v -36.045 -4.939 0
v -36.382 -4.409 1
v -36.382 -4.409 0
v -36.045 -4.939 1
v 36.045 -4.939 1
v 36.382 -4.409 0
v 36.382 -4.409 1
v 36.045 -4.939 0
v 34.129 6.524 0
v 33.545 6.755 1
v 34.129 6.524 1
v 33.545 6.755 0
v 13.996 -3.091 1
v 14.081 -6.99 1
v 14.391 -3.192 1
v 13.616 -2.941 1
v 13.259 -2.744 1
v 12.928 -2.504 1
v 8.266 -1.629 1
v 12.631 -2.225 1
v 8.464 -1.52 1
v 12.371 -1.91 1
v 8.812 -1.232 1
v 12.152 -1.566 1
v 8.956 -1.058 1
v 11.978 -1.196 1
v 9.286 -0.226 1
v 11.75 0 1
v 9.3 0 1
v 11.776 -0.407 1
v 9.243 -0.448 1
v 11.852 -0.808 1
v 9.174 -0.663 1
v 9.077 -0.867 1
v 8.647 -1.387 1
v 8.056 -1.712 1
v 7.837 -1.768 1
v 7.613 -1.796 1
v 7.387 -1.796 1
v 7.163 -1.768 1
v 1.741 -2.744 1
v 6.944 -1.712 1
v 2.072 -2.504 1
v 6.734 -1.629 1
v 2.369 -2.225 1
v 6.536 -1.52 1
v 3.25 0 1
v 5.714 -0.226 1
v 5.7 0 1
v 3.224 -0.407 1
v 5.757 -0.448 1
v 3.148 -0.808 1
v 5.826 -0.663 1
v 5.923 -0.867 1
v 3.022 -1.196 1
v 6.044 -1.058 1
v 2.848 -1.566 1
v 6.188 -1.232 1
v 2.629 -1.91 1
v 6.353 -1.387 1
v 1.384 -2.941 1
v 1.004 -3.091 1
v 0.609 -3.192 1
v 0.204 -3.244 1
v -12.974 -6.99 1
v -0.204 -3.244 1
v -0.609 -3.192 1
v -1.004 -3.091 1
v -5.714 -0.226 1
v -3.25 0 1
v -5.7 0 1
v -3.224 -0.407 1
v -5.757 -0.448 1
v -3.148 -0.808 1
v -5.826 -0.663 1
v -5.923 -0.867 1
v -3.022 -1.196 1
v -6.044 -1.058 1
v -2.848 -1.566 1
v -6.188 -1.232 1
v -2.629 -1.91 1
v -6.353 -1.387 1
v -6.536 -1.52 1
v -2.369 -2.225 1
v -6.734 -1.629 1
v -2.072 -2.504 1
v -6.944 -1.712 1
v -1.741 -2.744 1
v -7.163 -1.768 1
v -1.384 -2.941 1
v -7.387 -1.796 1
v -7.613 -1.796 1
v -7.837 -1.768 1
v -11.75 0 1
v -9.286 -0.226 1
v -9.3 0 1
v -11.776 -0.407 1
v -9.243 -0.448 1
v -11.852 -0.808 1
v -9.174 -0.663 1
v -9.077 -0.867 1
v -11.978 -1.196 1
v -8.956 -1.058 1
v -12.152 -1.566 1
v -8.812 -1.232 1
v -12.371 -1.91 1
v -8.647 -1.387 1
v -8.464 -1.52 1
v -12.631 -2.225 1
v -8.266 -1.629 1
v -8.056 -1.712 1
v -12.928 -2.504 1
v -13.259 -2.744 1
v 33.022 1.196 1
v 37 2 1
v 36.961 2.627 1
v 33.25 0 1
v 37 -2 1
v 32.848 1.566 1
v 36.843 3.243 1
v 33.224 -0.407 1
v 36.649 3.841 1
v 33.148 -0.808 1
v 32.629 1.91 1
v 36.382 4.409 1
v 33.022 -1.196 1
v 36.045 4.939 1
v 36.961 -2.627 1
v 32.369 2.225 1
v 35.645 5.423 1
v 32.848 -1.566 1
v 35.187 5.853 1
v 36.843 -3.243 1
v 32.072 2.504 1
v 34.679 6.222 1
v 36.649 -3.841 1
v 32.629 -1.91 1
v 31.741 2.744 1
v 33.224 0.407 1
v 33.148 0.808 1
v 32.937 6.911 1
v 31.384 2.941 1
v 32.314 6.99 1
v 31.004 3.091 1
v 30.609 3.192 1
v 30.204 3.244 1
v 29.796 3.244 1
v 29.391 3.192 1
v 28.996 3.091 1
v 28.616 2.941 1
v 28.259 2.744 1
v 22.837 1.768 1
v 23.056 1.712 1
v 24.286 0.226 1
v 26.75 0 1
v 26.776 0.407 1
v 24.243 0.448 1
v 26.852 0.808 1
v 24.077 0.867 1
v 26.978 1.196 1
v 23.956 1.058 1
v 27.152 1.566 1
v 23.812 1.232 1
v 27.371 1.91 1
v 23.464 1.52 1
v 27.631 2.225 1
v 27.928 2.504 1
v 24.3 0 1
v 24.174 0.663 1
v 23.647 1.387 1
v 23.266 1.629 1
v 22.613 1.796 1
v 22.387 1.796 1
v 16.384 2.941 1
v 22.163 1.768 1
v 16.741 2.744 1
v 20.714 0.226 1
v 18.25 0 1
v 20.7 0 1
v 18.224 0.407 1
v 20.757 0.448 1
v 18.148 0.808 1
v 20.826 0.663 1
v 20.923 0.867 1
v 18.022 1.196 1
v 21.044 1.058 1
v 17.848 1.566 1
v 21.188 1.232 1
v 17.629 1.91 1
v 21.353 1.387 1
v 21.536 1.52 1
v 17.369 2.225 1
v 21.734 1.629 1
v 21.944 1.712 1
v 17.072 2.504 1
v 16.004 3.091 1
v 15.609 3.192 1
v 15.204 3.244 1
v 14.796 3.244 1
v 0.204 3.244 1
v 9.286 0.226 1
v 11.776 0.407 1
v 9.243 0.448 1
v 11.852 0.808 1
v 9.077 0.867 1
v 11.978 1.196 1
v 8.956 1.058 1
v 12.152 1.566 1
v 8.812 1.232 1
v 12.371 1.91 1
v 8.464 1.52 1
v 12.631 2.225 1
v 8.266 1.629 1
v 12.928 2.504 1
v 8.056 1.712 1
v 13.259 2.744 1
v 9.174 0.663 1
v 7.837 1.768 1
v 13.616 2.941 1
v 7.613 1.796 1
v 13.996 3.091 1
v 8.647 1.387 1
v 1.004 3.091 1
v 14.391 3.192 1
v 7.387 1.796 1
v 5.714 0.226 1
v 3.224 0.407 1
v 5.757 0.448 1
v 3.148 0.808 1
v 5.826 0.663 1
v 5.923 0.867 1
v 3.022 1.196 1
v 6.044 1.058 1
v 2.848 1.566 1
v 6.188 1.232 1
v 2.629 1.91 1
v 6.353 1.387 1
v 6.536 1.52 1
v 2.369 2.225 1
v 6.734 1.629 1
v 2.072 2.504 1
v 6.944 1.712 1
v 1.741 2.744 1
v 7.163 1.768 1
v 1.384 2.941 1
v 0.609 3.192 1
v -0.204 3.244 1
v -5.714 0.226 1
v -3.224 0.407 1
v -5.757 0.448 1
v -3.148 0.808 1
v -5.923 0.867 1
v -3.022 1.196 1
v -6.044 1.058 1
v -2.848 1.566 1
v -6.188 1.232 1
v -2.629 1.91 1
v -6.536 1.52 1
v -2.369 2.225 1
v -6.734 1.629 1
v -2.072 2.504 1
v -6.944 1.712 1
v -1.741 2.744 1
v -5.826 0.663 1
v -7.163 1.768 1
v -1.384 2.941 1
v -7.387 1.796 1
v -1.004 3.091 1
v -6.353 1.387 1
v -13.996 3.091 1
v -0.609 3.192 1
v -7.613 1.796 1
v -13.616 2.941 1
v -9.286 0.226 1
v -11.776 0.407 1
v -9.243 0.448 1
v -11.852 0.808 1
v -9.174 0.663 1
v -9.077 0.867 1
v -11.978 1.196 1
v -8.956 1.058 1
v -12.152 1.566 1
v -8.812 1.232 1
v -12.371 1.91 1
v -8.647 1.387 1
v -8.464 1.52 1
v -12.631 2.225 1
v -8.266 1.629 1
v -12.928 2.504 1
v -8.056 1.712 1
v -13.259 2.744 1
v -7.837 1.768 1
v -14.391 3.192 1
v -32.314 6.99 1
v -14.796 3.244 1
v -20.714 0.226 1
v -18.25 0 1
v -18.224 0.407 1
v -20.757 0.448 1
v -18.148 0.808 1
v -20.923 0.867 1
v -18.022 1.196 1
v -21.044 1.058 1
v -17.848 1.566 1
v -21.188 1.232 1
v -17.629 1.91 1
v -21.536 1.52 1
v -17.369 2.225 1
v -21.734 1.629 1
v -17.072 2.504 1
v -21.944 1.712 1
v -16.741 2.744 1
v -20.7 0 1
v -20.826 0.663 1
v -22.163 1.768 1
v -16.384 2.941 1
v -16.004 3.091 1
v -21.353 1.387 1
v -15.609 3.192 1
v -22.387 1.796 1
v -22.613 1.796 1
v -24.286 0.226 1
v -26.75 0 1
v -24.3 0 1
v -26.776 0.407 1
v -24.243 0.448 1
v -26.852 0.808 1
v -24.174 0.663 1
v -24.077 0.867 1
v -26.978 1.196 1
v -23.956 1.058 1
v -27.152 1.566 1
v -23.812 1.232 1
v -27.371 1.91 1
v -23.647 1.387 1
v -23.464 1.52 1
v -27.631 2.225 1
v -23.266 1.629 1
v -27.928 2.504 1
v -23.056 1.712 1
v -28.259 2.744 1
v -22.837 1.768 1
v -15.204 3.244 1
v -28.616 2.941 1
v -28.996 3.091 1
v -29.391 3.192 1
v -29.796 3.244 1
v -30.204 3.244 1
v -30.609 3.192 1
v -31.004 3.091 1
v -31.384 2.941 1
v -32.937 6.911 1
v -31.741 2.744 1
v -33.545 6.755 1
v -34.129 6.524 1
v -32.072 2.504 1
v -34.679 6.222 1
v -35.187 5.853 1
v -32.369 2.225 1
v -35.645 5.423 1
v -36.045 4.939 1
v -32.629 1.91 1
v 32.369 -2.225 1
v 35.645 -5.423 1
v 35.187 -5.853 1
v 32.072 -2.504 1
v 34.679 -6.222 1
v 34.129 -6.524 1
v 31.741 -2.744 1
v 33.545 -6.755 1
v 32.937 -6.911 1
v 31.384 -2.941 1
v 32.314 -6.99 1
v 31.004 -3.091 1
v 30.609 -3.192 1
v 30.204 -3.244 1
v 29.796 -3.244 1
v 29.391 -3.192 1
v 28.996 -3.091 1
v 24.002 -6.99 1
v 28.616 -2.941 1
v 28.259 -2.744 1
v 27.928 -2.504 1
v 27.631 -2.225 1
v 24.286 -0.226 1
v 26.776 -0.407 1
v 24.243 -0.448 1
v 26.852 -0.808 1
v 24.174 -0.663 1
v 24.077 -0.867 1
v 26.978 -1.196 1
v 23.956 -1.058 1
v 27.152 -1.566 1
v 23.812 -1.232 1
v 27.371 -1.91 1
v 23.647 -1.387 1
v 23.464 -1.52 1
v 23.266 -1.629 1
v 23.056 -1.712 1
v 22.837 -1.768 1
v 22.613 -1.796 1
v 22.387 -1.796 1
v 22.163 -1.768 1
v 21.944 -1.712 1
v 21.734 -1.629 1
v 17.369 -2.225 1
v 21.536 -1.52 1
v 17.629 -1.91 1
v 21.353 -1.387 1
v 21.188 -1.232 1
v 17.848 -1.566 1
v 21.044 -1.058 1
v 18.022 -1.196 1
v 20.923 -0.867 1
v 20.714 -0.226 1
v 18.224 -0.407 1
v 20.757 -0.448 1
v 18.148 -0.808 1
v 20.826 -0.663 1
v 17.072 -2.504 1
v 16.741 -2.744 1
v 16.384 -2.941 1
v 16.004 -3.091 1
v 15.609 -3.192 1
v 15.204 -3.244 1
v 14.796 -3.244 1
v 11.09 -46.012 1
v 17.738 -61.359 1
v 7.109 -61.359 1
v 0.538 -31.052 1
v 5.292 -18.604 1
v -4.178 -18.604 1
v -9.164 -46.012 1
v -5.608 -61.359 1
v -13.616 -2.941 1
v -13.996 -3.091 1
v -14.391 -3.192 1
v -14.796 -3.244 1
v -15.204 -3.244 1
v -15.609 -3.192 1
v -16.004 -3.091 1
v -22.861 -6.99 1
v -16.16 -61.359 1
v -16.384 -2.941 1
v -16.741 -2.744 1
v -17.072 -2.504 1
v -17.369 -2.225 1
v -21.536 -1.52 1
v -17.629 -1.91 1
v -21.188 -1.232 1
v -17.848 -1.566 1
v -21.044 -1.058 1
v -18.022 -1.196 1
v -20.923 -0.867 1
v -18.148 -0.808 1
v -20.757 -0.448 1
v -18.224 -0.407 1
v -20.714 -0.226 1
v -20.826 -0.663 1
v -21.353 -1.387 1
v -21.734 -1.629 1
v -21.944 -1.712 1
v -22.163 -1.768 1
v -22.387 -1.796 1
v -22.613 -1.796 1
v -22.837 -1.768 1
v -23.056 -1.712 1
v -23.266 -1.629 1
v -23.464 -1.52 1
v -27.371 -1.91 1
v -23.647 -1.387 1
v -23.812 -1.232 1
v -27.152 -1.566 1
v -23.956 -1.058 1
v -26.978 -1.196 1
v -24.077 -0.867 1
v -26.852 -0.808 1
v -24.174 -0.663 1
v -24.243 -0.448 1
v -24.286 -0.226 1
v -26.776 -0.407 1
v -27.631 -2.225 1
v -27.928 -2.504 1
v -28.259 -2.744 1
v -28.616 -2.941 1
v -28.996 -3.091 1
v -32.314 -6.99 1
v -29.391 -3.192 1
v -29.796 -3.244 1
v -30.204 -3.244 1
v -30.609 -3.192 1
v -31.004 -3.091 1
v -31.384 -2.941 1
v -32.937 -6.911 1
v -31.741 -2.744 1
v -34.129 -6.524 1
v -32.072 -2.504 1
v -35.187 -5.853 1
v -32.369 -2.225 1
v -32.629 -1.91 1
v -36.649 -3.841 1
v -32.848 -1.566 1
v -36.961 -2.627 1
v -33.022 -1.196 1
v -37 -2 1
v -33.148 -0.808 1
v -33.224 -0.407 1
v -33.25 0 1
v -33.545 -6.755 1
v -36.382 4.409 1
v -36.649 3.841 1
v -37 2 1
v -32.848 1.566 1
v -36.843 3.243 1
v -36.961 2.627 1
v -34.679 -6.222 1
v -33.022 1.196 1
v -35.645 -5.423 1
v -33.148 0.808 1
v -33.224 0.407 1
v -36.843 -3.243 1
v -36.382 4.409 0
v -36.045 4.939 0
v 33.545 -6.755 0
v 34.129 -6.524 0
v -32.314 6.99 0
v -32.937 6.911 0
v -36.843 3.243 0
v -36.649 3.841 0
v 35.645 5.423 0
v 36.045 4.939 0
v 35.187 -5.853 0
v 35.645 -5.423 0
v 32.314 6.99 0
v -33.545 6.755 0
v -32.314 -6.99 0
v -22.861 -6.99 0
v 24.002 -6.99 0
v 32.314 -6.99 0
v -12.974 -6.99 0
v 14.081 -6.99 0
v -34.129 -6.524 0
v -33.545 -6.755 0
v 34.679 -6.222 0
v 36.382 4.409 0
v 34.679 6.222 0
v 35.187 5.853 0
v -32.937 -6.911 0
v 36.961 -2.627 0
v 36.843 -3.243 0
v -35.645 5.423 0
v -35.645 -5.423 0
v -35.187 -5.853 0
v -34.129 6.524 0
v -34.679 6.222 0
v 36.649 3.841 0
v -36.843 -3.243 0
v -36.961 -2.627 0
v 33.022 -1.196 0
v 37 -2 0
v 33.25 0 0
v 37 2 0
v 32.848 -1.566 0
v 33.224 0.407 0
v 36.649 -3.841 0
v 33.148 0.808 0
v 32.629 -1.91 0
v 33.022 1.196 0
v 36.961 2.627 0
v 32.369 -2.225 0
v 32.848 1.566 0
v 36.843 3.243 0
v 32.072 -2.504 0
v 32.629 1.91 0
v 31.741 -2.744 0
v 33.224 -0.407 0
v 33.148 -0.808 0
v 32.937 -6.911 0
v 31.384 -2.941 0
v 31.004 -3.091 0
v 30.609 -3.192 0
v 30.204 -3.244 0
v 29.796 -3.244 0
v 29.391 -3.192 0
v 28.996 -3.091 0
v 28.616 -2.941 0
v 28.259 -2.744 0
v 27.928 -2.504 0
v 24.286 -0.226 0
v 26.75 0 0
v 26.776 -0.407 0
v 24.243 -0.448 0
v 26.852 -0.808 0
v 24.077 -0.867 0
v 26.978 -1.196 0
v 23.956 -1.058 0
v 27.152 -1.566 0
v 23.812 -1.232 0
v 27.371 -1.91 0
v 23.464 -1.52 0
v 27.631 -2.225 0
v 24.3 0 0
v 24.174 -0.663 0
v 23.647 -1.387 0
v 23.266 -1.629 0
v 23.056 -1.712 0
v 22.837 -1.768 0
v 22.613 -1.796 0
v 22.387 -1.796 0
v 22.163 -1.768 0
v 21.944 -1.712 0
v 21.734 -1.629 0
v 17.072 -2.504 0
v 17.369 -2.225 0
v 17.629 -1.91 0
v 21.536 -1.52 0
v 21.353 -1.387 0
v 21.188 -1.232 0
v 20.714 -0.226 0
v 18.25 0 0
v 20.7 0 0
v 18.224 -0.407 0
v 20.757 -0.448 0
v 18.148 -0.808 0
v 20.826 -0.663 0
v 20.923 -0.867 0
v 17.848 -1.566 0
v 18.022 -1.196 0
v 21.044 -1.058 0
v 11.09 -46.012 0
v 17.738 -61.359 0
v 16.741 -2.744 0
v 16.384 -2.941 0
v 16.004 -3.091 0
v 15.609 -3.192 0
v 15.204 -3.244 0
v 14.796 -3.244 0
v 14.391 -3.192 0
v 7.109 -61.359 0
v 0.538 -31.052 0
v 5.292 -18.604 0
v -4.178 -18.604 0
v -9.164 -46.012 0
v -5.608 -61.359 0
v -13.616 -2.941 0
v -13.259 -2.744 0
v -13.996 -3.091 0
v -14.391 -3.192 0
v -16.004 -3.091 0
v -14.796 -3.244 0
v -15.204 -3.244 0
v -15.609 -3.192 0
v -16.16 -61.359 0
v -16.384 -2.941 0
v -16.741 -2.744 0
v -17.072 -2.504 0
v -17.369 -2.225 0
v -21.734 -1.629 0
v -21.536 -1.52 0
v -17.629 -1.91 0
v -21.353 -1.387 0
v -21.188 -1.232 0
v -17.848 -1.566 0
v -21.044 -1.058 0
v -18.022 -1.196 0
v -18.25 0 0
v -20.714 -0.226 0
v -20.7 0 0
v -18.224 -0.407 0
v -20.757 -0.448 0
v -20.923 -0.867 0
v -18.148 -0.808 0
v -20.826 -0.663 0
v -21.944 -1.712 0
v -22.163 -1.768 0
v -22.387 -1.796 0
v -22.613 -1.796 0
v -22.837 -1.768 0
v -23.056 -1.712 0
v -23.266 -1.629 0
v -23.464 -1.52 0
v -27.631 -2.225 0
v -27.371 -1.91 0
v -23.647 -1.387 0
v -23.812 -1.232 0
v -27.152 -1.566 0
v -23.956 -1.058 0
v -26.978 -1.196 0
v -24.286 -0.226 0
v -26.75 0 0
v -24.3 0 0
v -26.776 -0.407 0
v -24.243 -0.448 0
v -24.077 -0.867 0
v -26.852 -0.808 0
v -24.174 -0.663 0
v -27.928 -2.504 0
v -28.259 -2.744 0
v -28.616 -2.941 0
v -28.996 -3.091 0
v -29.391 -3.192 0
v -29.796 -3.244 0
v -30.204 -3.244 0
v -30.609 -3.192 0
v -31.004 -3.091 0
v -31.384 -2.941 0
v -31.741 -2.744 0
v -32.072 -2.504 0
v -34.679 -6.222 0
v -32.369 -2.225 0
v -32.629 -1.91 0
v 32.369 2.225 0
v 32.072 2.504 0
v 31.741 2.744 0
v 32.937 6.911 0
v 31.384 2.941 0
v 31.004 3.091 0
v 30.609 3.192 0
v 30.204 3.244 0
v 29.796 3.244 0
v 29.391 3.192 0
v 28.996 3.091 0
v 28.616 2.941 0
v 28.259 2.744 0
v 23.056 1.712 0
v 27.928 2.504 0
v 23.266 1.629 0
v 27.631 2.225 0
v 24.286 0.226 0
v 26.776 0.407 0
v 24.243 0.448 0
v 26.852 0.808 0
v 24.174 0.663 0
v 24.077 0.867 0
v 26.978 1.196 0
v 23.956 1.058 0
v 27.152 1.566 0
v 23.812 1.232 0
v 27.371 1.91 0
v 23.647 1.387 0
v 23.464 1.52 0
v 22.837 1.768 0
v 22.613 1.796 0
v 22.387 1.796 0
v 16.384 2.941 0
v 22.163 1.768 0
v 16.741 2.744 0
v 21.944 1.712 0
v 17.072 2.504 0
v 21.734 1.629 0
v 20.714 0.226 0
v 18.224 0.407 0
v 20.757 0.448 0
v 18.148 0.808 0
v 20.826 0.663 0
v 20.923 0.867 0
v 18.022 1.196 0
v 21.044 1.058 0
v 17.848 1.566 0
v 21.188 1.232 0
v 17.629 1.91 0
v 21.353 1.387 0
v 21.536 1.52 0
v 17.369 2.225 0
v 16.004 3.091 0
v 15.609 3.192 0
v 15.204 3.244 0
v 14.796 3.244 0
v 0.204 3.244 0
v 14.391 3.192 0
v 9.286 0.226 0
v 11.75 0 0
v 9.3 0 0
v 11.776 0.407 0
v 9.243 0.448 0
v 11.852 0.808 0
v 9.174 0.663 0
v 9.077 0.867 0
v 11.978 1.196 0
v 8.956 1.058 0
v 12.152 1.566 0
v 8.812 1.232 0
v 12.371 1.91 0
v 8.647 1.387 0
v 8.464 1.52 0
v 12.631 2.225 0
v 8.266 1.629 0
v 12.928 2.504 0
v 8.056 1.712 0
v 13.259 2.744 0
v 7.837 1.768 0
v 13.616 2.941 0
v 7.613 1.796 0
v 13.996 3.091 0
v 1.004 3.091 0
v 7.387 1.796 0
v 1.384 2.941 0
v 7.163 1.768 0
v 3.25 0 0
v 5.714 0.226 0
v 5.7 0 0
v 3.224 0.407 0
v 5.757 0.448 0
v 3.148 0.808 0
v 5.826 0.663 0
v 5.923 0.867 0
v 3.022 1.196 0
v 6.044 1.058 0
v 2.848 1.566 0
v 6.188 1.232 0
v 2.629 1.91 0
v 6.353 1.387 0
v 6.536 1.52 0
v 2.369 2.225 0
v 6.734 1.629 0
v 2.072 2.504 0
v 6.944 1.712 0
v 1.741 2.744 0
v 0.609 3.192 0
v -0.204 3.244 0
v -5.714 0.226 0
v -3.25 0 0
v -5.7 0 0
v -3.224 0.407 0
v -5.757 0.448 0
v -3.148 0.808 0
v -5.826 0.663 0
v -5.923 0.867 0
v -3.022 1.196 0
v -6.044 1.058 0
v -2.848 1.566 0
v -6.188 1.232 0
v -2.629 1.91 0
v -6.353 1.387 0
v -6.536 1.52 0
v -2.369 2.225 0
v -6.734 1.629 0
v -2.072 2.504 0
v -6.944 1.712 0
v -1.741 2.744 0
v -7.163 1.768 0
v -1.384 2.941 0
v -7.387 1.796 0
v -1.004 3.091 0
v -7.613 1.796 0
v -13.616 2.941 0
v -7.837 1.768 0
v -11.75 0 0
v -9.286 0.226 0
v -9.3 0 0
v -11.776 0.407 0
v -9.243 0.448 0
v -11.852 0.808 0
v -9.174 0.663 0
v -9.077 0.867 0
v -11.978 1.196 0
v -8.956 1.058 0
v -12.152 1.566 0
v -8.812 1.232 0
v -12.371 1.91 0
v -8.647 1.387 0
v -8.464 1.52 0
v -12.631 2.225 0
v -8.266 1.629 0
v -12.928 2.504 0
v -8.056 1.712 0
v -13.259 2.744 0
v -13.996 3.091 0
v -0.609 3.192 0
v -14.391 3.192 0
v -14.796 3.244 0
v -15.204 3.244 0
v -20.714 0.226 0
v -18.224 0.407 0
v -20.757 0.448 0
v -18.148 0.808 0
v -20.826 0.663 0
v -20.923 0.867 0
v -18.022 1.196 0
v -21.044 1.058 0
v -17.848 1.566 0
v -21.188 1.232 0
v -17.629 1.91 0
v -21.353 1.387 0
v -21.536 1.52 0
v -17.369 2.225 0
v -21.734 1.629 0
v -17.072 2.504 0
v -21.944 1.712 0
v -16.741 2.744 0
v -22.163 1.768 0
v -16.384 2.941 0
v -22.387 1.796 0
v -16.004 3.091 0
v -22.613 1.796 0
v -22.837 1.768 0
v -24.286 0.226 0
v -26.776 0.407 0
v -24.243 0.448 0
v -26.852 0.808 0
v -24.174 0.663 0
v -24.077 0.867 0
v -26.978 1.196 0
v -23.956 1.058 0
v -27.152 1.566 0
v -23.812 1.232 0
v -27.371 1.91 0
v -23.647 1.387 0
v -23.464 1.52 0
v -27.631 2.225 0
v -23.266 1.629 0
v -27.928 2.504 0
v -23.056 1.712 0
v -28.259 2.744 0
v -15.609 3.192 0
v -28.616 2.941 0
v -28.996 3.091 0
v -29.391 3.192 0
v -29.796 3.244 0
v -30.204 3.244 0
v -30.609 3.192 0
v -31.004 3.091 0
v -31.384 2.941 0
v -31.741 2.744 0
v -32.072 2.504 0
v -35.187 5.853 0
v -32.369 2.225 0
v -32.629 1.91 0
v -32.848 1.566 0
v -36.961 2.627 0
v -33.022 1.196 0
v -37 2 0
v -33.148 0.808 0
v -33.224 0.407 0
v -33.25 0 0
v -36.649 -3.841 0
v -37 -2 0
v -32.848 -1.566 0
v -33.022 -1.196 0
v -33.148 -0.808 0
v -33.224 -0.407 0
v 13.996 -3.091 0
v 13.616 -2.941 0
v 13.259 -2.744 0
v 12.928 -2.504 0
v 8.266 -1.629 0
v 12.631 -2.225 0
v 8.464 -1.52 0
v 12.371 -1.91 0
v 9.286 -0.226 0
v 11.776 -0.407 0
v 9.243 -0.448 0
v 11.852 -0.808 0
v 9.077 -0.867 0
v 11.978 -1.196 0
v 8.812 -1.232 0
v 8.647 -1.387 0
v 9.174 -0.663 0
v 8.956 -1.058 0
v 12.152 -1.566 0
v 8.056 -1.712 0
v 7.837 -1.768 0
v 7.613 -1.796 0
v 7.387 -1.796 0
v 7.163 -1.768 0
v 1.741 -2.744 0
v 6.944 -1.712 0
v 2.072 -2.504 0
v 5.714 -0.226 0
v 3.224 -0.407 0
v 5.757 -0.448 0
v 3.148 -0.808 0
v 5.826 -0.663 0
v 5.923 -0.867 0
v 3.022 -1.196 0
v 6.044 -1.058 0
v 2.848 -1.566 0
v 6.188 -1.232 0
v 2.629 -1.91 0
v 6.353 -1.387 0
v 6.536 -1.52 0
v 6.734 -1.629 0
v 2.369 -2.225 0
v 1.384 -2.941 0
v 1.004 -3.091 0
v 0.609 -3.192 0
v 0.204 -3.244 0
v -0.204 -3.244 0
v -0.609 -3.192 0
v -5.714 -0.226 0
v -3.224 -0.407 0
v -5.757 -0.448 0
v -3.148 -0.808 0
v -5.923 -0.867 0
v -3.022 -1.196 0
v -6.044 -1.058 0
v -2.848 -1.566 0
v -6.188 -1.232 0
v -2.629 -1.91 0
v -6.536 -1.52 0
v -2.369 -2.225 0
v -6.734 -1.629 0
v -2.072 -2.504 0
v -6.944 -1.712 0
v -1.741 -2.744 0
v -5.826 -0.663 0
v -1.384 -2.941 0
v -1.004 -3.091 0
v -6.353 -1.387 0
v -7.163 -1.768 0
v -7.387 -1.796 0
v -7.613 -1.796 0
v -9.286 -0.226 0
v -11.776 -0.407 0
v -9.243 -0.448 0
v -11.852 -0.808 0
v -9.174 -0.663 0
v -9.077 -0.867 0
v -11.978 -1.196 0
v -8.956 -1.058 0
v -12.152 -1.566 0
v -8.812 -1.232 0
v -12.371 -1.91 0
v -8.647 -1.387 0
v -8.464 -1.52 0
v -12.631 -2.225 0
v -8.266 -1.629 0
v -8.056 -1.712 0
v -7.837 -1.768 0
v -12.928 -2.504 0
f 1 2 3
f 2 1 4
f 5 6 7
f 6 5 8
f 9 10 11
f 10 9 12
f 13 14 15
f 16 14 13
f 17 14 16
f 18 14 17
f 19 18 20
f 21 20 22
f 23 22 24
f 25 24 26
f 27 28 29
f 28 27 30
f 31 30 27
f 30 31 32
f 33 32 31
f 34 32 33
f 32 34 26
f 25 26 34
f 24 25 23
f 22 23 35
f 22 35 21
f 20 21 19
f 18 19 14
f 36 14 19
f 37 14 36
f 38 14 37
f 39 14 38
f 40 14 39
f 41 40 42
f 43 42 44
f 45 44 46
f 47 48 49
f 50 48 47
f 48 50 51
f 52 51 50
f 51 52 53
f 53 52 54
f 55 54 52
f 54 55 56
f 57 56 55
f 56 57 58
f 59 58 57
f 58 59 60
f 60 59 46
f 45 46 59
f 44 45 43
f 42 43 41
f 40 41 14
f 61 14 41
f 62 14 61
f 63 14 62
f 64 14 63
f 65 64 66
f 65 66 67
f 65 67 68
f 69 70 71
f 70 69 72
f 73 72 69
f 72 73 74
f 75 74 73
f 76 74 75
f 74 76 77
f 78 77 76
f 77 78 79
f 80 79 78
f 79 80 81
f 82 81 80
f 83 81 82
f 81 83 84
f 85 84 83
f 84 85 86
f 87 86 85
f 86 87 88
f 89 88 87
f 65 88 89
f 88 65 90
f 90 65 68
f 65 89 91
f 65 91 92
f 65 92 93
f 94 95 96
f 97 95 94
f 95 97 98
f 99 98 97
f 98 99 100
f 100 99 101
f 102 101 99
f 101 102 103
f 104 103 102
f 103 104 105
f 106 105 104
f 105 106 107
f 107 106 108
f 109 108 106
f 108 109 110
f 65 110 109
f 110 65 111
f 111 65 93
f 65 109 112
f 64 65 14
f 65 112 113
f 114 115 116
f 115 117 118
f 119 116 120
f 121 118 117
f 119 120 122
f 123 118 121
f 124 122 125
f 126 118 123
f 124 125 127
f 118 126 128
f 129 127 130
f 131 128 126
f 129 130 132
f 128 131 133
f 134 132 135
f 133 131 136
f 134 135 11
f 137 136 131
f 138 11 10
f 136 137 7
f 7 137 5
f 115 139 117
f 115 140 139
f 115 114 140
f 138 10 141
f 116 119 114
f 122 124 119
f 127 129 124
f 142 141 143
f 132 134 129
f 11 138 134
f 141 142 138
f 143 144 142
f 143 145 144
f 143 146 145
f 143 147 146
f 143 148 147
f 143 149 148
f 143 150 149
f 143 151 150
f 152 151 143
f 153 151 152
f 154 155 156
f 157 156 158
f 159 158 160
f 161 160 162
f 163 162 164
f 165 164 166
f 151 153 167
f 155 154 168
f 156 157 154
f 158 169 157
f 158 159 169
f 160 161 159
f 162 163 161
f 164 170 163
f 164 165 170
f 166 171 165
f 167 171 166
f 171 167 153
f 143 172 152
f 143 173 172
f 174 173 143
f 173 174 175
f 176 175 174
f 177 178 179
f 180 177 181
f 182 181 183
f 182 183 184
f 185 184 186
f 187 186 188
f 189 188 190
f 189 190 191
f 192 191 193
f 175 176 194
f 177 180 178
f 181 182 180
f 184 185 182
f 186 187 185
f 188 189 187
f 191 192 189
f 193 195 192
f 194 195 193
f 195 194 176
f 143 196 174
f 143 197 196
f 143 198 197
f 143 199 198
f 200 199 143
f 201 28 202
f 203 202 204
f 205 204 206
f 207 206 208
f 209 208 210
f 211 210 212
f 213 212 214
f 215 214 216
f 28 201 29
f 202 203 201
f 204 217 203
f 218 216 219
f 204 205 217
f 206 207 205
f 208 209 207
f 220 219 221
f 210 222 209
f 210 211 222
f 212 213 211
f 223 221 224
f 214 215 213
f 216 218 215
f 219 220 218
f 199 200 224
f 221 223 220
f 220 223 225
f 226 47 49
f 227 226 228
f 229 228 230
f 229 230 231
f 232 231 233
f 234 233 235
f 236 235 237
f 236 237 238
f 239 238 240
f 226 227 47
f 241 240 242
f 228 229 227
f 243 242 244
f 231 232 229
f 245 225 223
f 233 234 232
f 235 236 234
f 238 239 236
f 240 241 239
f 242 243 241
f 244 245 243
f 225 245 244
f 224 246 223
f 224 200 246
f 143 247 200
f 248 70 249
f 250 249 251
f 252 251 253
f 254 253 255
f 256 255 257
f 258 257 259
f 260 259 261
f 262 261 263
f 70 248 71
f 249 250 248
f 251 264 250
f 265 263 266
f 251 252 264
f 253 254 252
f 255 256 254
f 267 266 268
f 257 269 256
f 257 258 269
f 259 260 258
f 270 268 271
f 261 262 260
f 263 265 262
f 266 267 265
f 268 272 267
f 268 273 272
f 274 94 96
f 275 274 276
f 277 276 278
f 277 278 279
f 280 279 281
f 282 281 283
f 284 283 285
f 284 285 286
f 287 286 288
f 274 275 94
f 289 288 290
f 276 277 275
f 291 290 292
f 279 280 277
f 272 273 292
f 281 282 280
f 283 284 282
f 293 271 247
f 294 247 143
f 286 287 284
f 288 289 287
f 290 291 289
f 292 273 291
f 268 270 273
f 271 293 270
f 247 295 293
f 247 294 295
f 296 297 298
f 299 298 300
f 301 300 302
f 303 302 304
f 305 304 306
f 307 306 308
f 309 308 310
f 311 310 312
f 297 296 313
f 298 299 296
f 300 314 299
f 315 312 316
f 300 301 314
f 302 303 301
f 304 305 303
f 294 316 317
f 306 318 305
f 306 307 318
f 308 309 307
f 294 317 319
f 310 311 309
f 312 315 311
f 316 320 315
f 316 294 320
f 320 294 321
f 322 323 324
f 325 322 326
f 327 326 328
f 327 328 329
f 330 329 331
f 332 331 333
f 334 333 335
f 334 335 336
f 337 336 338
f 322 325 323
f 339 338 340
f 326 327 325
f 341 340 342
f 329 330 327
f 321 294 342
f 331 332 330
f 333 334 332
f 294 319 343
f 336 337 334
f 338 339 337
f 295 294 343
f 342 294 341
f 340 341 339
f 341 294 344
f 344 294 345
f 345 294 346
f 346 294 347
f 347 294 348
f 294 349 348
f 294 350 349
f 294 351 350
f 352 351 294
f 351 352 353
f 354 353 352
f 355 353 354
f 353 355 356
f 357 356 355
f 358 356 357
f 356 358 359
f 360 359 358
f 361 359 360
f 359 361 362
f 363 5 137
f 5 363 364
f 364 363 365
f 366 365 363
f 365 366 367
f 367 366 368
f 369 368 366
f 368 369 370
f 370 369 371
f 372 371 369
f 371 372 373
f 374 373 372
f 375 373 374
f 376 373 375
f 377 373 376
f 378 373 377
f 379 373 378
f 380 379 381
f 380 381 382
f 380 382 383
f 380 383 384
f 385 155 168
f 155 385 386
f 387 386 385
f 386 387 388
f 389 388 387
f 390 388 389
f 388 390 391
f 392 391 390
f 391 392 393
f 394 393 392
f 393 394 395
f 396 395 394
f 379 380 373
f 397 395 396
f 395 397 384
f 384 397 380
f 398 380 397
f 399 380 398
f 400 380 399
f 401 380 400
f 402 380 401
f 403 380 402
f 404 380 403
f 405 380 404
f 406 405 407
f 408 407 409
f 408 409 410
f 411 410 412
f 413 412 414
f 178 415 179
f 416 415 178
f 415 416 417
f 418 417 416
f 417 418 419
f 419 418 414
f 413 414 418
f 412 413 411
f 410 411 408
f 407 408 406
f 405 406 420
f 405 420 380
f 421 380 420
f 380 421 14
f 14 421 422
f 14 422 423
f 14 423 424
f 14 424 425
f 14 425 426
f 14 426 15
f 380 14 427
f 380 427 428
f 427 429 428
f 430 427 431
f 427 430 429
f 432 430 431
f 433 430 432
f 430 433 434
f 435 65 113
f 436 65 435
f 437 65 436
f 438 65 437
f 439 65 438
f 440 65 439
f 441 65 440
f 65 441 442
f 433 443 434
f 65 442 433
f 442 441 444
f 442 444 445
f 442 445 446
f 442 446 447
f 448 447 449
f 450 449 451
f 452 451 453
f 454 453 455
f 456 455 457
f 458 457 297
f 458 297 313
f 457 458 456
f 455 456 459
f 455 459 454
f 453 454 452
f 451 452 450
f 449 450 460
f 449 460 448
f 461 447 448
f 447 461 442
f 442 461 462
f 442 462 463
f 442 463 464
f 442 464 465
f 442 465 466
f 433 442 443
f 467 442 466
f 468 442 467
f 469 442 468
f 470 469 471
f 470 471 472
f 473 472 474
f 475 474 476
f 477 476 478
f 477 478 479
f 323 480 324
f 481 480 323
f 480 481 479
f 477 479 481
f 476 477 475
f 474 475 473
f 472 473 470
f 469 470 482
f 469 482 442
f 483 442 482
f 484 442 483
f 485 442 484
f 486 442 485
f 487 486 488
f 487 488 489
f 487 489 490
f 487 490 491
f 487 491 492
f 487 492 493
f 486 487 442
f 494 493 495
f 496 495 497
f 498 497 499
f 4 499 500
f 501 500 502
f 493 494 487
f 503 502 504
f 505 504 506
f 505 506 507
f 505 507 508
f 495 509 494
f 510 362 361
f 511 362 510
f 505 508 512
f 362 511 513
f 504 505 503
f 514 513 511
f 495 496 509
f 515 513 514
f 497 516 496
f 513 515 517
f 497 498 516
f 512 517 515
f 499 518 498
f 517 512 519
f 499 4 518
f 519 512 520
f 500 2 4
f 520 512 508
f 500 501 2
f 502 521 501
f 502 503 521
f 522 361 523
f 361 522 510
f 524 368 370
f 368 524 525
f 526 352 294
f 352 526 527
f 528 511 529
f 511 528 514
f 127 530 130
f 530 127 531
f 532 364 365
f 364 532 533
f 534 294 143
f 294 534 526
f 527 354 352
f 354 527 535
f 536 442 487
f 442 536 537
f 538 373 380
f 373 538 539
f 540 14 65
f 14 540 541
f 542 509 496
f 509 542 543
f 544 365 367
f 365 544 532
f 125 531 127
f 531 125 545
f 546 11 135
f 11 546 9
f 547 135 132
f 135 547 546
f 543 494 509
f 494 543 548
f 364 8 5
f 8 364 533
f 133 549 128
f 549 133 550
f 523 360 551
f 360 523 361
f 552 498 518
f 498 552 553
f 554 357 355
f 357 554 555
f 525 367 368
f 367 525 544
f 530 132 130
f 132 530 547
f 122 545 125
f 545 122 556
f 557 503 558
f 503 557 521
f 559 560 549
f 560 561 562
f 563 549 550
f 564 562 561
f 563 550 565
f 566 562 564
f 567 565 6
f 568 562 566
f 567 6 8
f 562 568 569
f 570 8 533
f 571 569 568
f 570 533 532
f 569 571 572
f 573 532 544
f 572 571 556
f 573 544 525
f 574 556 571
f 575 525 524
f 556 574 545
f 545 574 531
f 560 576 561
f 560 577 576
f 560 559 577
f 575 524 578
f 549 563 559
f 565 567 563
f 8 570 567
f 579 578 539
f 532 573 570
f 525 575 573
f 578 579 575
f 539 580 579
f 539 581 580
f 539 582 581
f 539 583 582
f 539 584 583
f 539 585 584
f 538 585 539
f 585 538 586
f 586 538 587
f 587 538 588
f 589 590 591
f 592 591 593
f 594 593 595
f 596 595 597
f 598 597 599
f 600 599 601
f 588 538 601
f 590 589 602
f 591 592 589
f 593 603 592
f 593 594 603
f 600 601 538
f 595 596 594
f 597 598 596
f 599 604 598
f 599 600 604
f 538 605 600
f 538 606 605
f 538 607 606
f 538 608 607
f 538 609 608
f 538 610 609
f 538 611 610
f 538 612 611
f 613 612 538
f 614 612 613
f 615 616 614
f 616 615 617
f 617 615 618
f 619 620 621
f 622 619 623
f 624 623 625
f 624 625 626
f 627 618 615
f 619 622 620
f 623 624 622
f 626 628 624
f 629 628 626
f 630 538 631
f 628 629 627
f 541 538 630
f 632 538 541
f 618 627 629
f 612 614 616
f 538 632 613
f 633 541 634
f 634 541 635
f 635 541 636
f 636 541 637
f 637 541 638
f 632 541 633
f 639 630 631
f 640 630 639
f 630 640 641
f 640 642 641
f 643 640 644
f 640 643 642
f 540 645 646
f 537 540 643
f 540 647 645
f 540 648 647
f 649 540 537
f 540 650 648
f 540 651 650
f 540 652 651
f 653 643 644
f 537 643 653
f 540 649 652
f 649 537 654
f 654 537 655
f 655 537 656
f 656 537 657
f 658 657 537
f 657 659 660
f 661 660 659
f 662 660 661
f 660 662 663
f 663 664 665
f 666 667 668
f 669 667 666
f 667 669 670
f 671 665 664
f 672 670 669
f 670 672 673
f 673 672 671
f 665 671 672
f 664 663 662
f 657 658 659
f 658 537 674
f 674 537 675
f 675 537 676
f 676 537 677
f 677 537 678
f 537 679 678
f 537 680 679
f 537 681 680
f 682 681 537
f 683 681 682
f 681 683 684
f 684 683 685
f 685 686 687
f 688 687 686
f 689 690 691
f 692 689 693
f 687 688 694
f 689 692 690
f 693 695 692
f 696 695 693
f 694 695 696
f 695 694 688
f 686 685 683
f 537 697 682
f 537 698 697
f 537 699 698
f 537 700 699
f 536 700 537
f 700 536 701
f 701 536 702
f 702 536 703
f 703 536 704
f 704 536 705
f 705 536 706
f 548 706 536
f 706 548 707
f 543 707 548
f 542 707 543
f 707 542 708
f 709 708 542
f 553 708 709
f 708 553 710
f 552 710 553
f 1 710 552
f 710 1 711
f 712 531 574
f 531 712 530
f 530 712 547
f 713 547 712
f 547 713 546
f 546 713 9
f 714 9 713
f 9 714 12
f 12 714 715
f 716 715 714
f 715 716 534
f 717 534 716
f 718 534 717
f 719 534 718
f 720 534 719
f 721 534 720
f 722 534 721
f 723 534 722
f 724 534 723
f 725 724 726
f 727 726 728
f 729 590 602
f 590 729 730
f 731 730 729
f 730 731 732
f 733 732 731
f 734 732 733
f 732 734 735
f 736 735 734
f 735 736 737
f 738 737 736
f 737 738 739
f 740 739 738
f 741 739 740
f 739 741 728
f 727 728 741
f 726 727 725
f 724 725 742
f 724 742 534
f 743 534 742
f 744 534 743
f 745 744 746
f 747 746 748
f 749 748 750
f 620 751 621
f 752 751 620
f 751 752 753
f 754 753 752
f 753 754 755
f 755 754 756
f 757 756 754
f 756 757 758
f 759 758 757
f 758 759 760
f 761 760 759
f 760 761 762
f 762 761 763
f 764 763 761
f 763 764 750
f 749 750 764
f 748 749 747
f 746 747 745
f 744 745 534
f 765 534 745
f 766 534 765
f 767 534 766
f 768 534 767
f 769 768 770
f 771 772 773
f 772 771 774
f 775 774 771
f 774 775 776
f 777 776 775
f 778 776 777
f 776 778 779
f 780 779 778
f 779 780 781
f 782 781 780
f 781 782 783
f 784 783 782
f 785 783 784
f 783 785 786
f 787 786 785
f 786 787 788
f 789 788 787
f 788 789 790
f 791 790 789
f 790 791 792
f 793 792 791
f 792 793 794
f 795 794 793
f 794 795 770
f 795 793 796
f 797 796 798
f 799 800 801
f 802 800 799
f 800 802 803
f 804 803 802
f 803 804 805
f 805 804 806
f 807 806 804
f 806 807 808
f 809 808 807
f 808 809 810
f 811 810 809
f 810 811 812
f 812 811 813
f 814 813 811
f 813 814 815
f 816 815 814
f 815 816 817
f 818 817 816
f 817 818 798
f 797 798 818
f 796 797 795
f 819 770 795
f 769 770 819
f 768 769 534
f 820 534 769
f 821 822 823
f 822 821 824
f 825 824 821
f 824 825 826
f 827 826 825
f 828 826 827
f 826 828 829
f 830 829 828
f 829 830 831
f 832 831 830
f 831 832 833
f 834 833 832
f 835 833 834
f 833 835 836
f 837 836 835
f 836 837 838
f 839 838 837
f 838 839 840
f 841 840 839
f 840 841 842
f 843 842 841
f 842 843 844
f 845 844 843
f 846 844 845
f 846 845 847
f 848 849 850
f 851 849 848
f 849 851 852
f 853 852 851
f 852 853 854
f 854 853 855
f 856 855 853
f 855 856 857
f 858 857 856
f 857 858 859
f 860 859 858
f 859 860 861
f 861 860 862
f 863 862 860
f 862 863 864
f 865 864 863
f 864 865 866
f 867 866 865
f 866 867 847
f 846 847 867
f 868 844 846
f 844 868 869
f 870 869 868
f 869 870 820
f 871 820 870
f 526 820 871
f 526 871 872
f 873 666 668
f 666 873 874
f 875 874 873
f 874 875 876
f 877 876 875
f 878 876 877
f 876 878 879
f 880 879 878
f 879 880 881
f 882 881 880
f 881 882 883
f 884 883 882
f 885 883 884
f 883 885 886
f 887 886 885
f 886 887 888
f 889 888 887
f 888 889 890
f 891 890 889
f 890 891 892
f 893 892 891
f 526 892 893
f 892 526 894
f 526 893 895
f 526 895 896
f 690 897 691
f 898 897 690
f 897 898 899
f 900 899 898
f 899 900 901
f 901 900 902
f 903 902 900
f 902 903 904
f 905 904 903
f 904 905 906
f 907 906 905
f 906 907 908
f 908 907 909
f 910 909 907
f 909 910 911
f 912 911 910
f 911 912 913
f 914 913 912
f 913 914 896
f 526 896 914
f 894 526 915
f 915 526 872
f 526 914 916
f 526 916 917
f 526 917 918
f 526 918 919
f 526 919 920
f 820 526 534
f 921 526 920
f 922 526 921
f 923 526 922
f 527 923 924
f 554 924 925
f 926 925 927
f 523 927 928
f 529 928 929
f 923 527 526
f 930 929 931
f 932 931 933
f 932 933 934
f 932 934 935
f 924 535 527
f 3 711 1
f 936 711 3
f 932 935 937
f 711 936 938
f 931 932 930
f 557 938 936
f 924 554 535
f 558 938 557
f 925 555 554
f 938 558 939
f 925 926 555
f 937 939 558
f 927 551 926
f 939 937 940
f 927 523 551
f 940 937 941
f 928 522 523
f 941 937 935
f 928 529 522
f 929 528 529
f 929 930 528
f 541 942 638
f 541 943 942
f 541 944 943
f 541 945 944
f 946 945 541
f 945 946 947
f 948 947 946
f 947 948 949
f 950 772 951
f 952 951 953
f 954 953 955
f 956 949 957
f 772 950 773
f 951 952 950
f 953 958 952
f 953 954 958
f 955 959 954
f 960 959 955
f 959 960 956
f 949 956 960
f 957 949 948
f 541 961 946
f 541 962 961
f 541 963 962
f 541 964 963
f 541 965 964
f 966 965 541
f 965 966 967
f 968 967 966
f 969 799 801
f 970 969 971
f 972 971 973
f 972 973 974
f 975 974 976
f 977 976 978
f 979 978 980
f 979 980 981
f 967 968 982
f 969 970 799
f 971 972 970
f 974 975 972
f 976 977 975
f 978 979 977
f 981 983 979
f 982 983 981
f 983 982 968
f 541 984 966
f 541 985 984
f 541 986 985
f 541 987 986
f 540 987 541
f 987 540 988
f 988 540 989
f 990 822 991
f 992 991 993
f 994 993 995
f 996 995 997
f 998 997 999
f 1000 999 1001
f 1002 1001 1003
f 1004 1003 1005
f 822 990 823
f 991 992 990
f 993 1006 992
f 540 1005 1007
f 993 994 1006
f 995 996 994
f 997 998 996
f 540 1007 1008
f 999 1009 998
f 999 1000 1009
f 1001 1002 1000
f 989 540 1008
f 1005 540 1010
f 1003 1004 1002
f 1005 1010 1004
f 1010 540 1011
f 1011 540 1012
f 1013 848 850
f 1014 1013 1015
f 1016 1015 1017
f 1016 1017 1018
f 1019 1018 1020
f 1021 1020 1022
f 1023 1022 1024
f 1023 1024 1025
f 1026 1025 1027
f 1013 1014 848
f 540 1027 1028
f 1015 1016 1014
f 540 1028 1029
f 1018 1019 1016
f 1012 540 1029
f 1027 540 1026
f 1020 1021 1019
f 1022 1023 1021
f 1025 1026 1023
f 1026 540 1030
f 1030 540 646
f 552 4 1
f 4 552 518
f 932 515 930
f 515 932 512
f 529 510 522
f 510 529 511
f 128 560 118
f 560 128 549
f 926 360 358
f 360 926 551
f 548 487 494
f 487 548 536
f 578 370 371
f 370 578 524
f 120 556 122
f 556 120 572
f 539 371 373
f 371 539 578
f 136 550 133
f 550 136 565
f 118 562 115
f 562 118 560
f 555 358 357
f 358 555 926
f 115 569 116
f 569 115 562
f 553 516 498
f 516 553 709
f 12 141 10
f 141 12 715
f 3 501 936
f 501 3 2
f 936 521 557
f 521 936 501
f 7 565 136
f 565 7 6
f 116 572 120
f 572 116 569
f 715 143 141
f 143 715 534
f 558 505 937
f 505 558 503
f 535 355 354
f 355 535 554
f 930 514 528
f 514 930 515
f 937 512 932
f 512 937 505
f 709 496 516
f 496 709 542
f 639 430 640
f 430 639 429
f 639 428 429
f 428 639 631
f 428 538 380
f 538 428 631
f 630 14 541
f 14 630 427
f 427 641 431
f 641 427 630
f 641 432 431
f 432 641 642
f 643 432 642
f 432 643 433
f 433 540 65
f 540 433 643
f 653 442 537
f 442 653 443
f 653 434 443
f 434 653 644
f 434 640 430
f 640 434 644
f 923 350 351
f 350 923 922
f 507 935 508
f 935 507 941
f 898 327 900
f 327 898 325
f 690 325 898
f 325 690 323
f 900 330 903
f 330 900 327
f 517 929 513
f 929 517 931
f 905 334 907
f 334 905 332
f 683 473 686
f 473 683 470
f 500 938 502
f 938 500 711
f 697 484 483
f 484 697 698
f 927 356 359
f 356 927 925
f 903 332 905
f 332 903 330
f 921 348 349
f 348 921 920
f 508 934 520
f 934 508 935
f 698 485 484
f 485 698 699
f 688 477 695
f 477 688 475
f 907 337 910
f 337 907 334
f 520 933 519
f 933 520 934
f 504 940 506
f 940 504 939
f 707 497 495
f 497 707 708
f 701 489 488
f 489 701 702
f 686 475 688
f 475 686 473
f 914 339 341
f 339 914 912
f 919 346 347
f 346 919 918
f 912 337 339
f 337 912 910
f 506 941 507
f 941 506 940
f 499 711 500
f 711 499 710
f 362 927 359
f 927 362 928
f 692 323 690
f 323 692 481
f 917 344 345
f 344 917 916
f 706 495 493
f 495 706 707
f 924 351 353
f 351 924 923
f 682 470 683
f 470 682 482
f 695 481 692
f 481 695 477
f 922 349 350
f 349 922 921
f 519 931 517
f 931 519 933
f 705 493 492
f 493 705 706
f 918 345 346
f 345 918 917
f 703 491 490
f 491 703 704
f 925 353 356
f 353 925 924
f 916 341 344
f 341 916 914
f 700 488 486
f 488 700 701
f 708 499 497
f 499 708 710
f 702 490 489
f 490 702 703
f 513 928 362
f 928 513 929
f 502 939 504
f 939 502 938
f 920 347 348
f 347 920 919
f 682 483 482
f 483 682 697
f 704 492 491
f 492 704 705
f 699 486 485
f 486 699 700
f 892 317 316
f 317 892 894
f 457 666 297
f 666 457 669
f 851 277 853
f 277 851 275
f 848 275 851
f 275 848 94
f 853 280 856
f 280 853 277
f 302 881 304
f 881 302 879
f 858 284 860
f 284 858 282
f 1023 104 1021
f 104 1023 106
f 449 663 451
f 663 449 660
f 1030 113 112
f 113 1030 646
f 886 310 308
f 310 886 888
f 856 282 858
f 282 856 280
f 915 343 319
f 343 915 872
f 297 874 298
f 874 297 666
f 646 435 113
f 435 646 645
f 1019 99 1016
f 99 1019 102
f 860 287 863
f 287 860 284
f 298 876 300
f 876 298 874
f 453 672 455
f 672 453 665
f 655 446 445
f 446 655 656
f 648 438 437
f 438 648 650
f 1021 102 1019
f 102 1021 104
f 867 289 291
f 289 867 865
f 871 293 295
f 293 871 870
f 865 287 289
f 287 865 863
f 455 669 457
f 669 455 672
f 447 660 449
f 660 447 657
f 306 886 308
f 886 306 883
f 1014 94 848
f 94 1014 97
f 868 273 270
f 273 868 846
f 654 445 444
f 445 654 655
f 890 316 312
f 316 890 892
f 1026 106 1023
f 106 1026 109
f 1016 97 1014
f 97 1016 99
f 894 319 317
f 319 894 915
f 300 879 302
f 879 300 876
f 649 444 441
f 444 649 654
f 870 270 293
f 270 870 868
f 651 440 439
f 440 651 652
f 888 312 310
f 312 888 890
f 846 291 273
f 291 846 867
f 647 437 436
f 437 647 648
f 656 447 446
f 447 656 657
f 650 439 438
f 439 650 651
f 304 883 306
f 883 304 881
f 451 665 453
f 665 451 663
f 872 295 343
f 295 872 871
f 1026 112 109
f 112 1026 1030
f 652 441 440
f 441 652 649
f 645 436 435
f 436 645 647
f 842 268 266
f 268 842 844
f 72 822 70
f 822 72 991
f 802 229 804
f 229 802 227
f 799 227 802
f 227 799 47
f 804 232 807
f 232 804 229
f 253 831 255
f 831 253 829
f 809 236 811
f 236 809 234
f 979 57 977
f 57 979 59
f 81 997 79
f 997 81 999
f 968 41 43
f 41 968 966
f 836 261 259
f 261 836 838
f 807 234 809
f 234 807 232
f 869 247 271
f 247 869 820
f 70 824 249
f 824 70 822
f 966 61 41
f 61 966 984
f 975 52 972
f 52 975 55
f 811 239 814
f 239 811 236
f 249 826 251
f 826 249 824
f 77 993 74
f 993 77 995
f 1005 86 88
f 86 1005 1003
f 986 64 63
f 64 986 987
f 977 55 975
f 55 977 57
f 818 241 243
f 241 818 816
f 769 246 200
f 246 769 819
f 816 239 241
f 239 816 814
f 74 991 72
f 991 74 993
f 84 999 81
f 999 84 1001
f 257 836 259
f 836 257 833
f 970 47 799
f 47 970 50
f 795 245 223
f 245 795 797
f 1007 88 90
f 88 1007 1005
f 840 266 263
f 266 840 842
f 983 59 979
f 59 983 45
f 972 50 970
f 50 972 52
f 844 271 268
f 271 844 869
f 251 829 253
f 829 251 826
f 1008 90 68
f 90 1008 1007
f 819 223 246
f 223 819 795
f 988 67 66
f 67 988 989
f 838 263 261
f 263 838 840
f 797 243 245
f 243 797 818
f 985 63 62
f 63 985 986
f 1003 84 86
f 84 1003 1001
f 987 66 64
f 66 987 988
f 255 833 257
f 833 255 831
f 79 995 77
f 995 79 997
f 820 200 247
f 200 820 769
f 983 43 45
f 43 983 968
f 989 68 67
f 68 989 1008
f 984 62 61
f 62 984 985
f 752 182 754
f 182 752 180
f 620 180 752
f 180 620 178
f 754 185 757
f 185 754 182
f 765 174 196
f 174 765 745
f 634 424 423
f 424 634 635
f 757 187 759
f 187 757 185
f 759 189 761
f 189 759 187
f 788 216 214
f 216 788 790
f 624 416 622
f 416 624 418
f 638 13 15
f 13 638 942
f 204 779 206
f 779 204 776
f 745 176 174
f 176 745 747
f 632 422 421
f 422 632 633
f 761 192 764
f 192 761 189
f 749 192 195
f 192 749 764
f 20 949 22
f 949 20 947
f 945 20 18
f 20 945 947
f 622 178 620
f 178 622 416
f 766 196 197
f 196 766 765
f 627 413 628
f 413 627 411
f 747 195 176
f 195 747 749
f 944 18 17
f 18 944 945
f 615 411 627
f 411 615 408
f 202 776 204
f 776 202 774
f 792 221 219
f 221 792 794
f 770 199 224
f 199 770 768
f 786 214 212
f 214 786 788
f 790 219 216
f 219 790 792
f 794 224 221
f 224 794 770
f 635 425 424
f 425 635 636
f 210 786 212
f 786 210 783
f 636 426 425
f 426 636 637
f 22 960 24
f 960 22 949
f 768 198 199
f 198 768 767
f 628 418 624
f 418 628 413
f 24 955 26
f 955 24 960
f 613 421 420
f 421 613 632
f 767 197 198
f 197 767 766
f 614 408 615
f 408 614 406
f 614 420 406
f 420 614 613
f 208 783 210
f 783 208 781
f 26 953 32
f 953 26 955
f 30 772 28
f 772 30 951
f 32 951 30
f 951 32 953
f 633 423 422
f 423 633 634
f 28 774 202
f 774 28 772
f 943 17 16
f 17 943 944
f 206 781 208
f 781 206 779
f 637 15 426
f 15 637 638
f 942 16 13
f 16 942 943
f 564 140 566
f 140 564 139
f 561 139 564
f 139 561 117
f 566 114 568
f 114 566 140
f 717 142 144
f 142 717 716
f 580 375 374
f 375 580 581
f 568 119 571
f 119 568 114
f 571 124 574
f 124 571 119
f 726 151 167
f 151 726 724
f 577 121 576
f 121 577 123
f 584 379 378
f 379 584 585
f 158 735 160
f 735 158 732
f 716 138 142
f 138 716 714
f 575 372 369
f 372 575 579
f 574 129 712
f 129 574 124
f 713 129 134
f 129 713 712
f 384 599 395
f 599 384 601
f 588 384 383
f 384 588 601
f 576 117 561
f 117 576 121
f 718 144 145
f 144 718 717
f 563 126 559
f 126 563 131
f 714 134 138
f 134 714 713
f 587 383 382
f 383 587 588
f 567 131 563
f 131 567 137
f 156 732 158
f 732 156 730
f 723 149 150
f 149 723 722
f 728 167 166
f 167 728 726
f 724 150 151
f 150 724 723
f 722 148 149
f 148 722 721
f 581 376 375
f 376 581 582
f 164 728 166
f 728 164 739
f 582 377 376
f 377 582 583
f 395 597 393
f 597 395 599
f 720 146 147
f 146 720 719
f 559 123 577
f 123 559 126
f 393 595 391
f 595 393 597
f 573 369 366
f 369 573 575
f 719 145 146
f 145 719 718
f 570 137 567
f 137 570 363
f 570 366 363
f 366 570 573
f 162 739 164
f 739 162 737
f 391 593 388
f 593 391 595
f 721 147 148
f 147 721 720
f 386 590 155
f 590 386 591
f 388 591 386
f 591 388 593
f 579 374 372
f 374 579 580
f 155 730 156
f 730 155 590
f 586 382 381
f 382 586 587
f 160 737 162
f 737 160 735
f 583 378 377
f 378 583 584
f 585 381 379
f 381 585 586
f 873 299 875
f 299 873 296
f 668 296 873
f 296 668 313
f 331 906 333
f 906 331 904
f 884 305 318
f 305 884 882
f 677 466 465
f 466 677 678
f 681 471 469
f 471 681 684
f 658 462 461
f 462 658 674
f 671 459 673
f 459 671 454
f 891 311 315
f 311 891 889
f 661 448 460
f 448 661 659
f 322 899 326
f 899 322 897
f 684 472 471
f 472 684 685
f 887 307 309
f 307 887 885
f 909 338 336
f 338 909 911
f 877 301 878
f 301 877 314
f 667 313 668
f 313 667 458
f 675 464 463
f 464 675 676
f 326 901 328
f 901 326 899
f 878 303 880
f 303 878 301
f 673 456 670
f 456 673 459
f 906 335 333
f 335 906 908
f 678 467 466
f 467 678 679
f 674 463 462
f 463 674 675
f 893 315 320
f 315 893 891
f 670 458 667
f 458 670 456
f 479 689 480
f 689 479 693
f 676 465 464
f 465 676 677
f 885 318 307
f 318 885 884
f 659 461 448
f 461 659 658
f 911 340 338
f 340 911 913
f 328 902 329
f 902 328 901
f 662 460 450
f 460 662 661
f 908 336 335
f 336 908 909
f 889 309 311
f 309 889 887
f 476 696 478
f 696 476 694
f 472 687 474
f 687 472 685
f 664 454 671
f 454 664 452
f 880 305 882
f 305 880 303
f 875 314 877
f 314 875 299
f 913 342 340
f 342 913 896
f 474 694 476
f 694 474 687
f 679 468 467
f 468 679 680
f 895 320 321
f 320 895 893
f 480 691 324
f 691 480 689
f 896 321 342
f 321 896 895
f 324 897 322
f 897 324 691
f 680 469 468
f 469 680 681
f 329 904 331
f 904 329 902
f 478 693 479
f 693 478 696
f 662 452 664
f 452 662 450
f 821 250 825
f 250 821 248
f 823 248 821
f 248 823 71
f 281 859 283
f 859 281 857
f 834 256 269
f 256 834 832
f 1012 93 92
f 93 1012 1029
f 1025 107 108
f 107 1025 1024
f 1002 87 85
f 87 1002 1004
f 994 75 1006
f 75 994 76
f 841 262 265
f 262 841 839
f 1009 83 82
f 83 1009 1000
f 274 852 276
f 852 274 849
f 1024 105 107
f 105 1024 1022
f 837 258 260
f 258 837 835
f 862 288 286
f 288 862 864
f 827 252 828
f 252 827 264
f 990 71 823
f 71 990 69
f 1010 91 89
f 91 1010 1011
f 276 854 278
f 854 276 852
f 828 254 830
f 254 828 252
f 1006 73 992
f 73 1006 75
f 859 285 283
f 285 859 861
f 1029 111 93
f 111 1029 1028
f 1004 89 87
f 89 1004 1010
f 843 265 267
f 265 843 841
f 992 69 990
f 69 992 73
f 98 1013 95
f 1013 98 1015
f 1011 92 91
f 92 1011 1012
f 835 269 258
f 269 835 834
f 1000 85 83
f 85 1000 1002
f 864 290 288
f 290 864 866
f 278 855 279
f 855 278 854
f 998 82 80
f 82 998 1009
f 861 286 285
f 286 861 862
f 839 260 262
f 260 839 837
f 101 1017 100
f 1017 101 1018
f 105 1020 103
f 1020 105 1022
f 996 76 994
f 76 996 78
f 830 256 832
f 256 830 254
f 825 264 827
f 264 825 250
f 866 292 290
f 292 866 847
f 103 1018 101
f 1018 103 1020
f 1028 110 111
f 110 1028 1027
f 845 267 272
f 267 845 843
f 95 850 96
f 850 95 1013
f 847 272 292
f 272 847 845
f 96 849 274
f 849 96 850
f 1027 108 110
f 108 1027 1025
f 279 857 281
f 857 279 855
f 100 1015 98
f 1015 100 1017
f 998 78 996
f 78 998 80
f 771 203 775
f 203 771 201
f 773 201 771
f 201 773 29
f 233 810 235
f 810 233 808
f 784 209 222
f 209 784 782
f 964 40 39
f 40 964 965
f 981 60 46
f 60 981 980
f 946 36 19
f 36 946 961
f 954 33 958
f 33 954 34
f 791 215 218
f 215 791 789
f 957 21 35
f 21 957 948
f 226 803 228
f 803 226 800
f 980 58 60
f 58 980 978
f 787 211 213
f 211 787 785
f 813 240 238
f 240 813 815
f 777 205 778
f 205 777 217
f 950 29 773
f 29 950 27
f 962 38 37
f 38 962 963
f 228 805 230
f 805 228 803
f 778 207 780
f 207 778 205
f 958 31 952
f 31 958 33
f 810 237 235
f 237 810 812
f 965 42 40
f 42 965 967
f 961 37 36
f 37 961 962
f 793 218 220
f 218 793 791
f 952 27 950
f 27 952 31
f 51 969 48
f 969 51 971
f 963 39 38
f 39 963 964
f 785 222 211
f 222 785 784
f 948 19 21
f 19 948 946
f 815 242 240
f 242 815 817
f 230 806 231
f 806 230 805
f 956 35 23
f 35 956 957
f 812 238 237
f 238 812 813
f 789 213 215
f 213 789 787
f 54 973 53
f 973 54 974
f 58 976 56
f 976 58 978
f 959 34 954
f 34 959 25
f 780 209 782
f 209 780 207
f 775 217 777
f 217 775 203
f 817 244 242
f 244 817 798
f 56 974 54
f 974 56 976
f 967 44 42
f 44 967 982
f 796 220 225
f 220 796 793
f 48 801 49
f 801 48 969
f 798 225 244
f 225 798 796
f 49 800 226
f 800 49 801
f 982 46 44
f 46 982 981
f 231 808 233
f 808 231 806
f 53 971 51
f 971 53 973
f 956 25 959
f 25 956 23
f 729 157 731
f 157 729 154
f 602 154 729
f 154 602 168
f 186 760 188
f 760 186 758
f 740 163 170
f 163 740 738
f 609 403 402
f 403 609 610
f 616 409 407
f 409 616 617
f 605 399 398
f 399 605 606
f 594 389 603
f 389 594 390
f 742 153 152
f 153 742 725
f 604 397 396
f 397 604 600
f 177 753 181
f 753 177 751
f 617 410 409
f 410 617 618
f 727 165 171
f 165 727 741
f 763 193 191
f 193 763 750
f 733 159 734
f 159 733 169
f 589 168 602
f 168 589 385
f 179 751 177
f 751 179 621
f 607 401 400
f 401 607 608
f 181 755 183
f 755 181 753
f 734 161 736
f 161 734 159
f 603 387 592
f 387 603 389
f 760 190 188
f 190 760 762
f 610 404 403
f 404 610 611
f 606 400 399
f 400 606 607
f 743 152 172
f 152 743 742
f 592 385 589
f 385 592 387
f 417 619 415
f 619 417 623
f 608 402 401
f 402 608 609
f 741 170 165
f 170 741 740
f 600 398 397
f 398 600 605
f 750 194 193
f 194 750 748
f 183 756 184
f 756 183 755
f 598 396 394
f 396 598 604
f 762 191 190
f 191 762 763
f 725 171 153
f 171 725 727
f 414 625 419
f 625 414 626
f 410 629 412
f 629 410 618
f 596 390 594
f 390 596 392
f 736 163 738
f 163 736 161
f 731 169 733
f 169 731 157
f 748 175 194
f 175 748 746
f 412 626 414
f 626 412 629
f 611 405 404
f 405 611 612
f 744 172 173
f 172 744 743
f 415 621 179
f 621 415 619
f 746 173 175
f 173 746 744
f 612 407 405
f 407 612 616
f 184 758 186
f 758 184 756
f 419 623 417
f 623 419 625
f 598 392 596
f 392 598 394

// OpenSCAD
$fn = 50;


difference() {
	union() {
		*color(alpha = 1.0000000000, c = "gray") {
			translate(v = [0, 14, 0]) {
				linear_extrude(height = 1) {
					text(font = "Arial:style=Bold", halign = "center", size = 4.5000000000, text = "COMMENT description oobb_plate_shape_p_type_1_depth_5_width_1_thickness_w_extra_oobb_size", valign = "center");
				}
			}
		}
		hull() {
			translate(v = [-32.0000000000, 2.0000000000, 0]) {
				cylinder(h = 1, r = 5);
			}
			translate(v = [32.0000000000, 2.0000000000, 0]) {
				cylinder(h = 1, r = 5);
			}
			translate(v = [-32.0000000000, -2.0000000000, 0]) {
				cylinder(h = 1, r = 5);
			}
			translate(v = [32.0000000000, -2.0000000000, 0]) {
				cylinder(h = 1, r = 5);
			}
		}
		translate(v = [0, -5, 0]) {
			linear_extrude(height = 1) {
				text(font = "DejaVu Sans Mono:style=Bold", halign = "center", size = 57.0000000000, text = "W", valign = "top");
			}
		}
	}
	union() {
		*color(alpha = 1.0000000000, c = "gray") {
			translate(v = [0, 14, 0]) {
				linear_extrude(height = 1) {
					text(font = "Arial:style=Bold", halign = "center", size = 4.5000000000, text = "COMMENT description oobb_holes_shape_n_type_5_width_1_thickness_w_extra_oobb_size_1_height_'all'_holes_true_both_holes", valign = "center");
				}
			}
		}
		translate(v = [-30.0000000000, 0.0000000000, 0]) {
			translate(v = [0, 0, -50]) {
				cylinder(h = 100, r = 3.2500000000);
			}
		}
		translate(v = [-15.0000000000, 0.0000000000, 0]) {
			translate(v = [0, 0, -50]) {
				cylinder(h = 100, r = 3.2500000000);
			}
		}
		translate(v = [0, 0, -50]) {
			cylinder(h = 100, r = 3.2500000000);
		}
		translate(v = [15.0000000000, 0.0000000000, 0]) {
			translate(v = [0, 0, -50]) {
				cylinder(h = 100, r = 3.2500000000);
			}
		}
		translate(v = [30.0000000000, 0.0000000000, 0]) {
			translate(v = [0, 0, -50]) {
				cylinder(h = 100, r = 3.2500000000);
			}
		}
		translate(v = [-30.0000000000, 0.0000000000, 0]) {
			translate(v = [0, 0, -50]) {
				cylinder(h = 100, r = 1.8000000000);
			}
		}
		translate(v = [-22.5000000000, 0.0000000000, 0]) {
			translate(v = [0, 0, -50]) {
				cylinder(h = 100, r = 1.8000000000);
			}
		}
		translate(v = [-15.0000000000, 0.0000000000, 0]) {
			translate(v = [0, 0, -50]) {
				cylinder(h = 100, r = 1.8000000000);
			}
		}
		translate(v = [-7.5000000000, 0.0000000000, 0]) {
			translate(v = [0, 0, -50]) {
				cylinder(h = 100, r = 1.8000000000);
			}
		}
		translate(v = [0, 0, -50]) {
			cylinder(h = 100, r = 1.8000000000);
		}
		translate(v = [7.5000000000, 0.0000000000, 0]) {
			translate(v = [0, 0, -50]) {
				cylinder(h = 100, r = 1.8000000000);
			}
		}
		translate(v = [15.0000000000, 0.0000000000, 0]) {
			translate(v = [0, 0, -50]) {
				cylinder(h = 100, r = 1.8000000000);
			}
		}
		translate(v = [22.5000000000, 0.0000000000, 0]) {
			translate(v = [0, 0, -50]) {
				cylinder(h = 100, r = 1.8000000000);
			}
		}
		translate(v = [30.0000000000, 0.0000000000, 0]) {
			translate(v = [0, 0, -50]) {
				cylinder(h = 100, r = 1.8000000000);
			}
		}
	}
}
